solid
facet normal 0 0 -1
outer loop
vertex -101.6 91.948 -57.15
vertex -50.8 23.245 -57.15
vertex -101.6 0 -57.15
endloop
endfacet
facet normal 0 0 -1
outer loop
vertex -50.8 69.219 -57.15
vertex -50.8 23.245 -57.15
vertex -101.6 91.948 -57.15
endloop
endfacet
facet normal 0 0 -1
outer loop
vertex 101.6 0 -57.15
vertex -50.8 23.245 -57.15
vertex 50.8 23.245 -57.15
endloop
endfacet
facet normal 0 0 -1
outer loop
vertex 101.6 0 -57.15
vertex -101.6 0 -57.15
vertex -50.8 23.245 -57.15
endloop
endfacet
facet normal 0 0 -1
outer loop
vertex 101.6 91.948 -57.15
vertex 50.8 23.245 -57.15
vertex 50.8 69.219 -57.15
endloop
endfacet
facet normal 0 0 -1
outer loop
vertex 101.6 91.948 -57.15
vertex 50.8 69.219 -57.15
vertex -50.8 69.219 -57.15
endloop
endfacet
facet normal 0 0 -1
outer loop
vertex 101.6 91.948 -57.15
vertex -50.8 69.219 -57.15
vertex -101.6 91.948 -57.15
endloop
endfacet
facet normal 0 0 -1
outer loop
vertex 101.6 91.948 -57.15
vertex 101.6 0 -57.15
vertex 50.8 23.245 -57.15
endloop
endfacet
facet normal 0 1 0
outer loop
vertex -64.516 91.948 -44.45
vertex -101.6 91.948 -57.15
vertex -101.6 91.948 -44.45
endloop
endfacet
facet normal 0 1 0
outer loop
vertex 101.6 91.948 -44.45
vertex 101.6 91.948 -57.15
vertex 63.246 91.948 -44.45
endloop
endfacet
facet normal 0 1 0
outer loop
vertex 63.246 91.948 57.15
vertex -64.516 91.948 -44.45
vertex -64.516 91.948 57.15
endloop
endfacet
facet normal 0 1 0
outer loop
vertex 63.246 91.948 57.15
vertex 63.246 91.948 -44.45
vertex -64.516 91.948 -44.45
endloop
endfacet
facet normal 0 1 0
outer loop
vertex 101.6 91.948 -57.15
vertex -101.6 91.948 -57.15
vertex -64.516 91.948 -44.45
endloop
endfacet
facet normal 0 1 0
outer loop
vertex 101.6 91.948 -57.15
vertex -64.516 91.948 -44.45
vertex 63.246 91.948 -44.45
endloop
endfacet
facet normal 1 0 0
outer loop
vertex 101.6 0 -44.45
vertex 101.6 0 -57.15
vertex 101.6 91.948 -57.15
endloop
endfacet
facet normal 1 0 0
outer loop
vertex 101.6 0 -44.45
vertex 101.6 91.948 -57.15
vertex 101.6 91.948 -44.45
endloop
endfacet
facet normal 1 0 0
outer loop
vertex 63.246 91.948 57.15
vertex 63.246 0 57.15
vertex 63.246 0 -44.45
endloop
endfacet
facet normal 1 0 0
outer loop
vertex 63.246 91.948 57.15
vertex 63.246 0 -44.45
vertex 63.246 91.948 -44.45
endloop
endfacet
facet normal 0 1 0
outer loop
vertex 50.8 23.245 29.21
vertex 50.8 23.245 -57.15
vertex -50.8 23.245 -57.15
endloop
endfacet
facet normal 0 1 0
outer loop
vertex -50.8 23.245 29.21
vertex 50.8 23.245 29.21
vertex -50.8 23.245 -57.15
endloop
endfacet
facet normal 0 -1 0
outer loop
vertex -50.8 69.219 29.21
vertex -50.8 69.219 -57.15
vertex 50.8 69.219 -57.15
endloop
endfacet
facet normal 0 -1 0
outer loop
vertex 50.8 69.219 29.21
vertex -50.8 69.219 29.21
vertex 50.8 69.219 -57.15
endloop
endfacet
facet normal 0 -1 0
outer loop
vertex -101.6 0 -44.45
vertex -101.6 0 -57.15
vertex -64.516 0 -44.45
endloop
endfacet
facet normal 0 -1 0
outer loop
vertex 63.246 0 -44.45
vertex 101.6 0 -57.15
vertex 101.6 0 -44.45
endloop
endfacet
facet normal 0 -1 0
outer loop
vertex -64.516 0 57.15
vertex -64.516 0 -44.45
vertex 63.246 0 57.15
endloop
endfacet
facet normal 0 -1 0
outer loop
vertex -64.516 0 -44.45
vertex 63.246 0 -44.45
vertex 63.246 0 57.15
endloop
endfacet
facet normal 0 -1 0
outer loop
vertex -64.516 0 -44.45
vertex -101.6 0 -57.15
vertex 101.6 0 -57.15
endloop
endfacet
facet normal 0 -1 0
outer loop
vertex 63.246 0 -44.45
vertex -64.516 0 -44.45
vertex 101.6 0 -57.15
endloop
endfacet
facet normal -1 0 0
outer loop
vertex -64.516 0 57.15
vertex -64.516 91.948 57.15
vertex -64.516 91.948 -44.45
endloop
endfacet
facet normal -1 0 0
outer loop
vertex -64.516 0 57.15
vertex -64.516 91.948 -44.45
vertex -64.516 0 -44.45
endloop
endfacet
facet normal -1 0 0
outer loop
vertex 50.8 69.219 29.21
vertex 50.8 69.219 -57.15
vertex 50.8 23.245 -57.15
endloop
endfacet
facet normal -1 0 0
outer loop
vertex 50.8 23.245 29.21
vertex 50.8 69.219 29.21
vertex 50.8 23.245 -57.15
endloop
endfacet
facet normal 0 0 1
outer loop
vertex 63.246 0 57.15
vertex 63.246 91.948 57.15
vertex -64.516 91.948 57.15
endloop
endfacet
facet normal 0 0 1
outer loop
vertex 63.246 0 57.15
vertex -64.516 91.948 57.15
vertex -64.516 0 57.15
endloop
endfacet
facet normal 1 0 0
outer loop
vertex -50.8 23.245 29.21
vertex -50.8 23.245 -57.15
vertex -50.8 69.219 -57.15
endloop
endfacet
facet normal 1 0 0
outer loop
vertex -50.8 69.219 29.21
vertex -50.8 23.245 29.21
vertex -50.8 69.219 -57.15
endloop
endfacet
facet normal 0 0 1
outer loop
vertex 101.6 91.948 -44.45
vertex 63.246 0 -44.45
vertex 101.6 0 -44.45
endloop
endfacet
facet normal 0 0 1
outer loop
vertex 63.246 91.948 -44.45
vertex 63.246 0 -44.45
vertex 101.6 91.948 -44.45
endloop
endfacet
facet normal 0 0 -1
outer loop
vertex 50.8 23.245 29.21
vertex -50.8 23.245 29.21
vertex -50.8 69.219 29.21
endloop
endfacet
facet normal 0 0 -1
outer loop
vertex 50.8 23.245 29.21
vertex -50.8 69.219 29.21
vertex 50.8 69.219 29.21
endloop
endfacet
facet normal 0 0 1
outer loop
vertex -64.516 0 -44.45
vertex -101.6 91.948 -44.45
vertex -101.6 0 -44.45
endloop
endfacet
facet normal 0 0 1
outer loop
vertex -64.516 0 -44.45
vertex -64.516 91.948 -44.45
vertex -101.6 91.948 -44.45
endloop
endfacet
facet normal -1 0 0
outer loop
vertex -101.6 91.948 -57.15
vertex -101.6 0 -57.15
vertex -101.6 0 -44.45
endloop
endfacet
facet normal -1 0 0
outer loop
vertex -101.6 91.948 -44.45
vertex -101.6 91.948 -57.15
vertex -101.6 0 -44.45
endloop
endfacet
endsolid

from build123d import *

# Parameters (mm, degrees)
F0_W      = 152.4
F0_H      = 114.3
F1_DEPTH  = 91.948
F2_W      = 91.948
F2_H      = 101.6
F3_DEPTH  = 37.084
F4_W      = 91.948
F4_H      = 101.6
F5_DEPTH  = 37.084
F6_DEPTH  = 24.13
F7_DEPTH  = 25.4
F8_DEPTH  = 25.4
F9_DEPTH  = 25.4
F12_DEPTH = 86.36


with BuildPart() as f1:
    # F0 (on Front) → F1 (new body)
    with BuildSketch(Plane.XZ):
        Rectangle(F0_W, F0_H)
    extrude(amount=-F1_DEPTH)

    # F2 (on face) → F3 (cut)
    with BuildSketch(Plane.YZ.offset(76.2)):
        with Locations((45.974, 6.35)):
            Rectangle(F2_W, F2_H)
    extrude(amount=-F3_DEPTH, mode=Mode.SUBTRACT)

    # F4 (on face) → F5 (cut)
    with BuildSketch(Plane(origin=(-76.2, 0, 0), x_dir=(0, -1, 0), z_dir=(-1, 0, 0))):
        with Locations((-45.974, 6.35)):
            Rectangle(F4_W, F4_H)
    extrude(amount=-F5_DEPTH, mode=Mode.SUBTRACT)

    # F6 (add): a face of the model
    f6_faces = [f1.faces().sort_by_distance(p)[0] for p in [
        (39.116, 45.974, 6.35),
    ]]
    extrude(f6_faces, amount=F6_DEPTH)

    # F7 (add): a face of the model
    f7_faces = [f1.faces().sort_by_distance(p)[0] for p in [
        (-39.116, 45.974, 6.35),
    ]]
    extrude(f7_faces, amount=F7_DEPTH)

    # F8 (add): a face of the model
    f8_faces = [f1.faces().sort_by_distance(p)[0] for p in [
        (76.2, 45.974, -50.8),
    ]]
    extrude(f8_faces, amount=F8_DEPTH)

    # F9 (add): a face of the model
    f9_faces = [f1.faces().sort_by_distance(p)[0] for p in [
        (-76.2, 45.974, -50.8),
    ]]
    extrude(f9_faces, amount=F9_DEPTH)

    # F11 (on face) → F12 (cut)
    with BuildSketch(Plane(origin=(0, 0, -57.15), x_dir=(1, 0, 0), z_dir=(0, 0, -1))):
        Polygon((50.8, -69.2191192026), (50.8, -23.2451192026), (-50.8, -23.2451192026), (-50.8, -69.2191192026), (0, -69.2191192026), align=None)
    extrude(amount=-F12_DEPTH, mode=Mode.SUBTRACT)


solid = f1.part
